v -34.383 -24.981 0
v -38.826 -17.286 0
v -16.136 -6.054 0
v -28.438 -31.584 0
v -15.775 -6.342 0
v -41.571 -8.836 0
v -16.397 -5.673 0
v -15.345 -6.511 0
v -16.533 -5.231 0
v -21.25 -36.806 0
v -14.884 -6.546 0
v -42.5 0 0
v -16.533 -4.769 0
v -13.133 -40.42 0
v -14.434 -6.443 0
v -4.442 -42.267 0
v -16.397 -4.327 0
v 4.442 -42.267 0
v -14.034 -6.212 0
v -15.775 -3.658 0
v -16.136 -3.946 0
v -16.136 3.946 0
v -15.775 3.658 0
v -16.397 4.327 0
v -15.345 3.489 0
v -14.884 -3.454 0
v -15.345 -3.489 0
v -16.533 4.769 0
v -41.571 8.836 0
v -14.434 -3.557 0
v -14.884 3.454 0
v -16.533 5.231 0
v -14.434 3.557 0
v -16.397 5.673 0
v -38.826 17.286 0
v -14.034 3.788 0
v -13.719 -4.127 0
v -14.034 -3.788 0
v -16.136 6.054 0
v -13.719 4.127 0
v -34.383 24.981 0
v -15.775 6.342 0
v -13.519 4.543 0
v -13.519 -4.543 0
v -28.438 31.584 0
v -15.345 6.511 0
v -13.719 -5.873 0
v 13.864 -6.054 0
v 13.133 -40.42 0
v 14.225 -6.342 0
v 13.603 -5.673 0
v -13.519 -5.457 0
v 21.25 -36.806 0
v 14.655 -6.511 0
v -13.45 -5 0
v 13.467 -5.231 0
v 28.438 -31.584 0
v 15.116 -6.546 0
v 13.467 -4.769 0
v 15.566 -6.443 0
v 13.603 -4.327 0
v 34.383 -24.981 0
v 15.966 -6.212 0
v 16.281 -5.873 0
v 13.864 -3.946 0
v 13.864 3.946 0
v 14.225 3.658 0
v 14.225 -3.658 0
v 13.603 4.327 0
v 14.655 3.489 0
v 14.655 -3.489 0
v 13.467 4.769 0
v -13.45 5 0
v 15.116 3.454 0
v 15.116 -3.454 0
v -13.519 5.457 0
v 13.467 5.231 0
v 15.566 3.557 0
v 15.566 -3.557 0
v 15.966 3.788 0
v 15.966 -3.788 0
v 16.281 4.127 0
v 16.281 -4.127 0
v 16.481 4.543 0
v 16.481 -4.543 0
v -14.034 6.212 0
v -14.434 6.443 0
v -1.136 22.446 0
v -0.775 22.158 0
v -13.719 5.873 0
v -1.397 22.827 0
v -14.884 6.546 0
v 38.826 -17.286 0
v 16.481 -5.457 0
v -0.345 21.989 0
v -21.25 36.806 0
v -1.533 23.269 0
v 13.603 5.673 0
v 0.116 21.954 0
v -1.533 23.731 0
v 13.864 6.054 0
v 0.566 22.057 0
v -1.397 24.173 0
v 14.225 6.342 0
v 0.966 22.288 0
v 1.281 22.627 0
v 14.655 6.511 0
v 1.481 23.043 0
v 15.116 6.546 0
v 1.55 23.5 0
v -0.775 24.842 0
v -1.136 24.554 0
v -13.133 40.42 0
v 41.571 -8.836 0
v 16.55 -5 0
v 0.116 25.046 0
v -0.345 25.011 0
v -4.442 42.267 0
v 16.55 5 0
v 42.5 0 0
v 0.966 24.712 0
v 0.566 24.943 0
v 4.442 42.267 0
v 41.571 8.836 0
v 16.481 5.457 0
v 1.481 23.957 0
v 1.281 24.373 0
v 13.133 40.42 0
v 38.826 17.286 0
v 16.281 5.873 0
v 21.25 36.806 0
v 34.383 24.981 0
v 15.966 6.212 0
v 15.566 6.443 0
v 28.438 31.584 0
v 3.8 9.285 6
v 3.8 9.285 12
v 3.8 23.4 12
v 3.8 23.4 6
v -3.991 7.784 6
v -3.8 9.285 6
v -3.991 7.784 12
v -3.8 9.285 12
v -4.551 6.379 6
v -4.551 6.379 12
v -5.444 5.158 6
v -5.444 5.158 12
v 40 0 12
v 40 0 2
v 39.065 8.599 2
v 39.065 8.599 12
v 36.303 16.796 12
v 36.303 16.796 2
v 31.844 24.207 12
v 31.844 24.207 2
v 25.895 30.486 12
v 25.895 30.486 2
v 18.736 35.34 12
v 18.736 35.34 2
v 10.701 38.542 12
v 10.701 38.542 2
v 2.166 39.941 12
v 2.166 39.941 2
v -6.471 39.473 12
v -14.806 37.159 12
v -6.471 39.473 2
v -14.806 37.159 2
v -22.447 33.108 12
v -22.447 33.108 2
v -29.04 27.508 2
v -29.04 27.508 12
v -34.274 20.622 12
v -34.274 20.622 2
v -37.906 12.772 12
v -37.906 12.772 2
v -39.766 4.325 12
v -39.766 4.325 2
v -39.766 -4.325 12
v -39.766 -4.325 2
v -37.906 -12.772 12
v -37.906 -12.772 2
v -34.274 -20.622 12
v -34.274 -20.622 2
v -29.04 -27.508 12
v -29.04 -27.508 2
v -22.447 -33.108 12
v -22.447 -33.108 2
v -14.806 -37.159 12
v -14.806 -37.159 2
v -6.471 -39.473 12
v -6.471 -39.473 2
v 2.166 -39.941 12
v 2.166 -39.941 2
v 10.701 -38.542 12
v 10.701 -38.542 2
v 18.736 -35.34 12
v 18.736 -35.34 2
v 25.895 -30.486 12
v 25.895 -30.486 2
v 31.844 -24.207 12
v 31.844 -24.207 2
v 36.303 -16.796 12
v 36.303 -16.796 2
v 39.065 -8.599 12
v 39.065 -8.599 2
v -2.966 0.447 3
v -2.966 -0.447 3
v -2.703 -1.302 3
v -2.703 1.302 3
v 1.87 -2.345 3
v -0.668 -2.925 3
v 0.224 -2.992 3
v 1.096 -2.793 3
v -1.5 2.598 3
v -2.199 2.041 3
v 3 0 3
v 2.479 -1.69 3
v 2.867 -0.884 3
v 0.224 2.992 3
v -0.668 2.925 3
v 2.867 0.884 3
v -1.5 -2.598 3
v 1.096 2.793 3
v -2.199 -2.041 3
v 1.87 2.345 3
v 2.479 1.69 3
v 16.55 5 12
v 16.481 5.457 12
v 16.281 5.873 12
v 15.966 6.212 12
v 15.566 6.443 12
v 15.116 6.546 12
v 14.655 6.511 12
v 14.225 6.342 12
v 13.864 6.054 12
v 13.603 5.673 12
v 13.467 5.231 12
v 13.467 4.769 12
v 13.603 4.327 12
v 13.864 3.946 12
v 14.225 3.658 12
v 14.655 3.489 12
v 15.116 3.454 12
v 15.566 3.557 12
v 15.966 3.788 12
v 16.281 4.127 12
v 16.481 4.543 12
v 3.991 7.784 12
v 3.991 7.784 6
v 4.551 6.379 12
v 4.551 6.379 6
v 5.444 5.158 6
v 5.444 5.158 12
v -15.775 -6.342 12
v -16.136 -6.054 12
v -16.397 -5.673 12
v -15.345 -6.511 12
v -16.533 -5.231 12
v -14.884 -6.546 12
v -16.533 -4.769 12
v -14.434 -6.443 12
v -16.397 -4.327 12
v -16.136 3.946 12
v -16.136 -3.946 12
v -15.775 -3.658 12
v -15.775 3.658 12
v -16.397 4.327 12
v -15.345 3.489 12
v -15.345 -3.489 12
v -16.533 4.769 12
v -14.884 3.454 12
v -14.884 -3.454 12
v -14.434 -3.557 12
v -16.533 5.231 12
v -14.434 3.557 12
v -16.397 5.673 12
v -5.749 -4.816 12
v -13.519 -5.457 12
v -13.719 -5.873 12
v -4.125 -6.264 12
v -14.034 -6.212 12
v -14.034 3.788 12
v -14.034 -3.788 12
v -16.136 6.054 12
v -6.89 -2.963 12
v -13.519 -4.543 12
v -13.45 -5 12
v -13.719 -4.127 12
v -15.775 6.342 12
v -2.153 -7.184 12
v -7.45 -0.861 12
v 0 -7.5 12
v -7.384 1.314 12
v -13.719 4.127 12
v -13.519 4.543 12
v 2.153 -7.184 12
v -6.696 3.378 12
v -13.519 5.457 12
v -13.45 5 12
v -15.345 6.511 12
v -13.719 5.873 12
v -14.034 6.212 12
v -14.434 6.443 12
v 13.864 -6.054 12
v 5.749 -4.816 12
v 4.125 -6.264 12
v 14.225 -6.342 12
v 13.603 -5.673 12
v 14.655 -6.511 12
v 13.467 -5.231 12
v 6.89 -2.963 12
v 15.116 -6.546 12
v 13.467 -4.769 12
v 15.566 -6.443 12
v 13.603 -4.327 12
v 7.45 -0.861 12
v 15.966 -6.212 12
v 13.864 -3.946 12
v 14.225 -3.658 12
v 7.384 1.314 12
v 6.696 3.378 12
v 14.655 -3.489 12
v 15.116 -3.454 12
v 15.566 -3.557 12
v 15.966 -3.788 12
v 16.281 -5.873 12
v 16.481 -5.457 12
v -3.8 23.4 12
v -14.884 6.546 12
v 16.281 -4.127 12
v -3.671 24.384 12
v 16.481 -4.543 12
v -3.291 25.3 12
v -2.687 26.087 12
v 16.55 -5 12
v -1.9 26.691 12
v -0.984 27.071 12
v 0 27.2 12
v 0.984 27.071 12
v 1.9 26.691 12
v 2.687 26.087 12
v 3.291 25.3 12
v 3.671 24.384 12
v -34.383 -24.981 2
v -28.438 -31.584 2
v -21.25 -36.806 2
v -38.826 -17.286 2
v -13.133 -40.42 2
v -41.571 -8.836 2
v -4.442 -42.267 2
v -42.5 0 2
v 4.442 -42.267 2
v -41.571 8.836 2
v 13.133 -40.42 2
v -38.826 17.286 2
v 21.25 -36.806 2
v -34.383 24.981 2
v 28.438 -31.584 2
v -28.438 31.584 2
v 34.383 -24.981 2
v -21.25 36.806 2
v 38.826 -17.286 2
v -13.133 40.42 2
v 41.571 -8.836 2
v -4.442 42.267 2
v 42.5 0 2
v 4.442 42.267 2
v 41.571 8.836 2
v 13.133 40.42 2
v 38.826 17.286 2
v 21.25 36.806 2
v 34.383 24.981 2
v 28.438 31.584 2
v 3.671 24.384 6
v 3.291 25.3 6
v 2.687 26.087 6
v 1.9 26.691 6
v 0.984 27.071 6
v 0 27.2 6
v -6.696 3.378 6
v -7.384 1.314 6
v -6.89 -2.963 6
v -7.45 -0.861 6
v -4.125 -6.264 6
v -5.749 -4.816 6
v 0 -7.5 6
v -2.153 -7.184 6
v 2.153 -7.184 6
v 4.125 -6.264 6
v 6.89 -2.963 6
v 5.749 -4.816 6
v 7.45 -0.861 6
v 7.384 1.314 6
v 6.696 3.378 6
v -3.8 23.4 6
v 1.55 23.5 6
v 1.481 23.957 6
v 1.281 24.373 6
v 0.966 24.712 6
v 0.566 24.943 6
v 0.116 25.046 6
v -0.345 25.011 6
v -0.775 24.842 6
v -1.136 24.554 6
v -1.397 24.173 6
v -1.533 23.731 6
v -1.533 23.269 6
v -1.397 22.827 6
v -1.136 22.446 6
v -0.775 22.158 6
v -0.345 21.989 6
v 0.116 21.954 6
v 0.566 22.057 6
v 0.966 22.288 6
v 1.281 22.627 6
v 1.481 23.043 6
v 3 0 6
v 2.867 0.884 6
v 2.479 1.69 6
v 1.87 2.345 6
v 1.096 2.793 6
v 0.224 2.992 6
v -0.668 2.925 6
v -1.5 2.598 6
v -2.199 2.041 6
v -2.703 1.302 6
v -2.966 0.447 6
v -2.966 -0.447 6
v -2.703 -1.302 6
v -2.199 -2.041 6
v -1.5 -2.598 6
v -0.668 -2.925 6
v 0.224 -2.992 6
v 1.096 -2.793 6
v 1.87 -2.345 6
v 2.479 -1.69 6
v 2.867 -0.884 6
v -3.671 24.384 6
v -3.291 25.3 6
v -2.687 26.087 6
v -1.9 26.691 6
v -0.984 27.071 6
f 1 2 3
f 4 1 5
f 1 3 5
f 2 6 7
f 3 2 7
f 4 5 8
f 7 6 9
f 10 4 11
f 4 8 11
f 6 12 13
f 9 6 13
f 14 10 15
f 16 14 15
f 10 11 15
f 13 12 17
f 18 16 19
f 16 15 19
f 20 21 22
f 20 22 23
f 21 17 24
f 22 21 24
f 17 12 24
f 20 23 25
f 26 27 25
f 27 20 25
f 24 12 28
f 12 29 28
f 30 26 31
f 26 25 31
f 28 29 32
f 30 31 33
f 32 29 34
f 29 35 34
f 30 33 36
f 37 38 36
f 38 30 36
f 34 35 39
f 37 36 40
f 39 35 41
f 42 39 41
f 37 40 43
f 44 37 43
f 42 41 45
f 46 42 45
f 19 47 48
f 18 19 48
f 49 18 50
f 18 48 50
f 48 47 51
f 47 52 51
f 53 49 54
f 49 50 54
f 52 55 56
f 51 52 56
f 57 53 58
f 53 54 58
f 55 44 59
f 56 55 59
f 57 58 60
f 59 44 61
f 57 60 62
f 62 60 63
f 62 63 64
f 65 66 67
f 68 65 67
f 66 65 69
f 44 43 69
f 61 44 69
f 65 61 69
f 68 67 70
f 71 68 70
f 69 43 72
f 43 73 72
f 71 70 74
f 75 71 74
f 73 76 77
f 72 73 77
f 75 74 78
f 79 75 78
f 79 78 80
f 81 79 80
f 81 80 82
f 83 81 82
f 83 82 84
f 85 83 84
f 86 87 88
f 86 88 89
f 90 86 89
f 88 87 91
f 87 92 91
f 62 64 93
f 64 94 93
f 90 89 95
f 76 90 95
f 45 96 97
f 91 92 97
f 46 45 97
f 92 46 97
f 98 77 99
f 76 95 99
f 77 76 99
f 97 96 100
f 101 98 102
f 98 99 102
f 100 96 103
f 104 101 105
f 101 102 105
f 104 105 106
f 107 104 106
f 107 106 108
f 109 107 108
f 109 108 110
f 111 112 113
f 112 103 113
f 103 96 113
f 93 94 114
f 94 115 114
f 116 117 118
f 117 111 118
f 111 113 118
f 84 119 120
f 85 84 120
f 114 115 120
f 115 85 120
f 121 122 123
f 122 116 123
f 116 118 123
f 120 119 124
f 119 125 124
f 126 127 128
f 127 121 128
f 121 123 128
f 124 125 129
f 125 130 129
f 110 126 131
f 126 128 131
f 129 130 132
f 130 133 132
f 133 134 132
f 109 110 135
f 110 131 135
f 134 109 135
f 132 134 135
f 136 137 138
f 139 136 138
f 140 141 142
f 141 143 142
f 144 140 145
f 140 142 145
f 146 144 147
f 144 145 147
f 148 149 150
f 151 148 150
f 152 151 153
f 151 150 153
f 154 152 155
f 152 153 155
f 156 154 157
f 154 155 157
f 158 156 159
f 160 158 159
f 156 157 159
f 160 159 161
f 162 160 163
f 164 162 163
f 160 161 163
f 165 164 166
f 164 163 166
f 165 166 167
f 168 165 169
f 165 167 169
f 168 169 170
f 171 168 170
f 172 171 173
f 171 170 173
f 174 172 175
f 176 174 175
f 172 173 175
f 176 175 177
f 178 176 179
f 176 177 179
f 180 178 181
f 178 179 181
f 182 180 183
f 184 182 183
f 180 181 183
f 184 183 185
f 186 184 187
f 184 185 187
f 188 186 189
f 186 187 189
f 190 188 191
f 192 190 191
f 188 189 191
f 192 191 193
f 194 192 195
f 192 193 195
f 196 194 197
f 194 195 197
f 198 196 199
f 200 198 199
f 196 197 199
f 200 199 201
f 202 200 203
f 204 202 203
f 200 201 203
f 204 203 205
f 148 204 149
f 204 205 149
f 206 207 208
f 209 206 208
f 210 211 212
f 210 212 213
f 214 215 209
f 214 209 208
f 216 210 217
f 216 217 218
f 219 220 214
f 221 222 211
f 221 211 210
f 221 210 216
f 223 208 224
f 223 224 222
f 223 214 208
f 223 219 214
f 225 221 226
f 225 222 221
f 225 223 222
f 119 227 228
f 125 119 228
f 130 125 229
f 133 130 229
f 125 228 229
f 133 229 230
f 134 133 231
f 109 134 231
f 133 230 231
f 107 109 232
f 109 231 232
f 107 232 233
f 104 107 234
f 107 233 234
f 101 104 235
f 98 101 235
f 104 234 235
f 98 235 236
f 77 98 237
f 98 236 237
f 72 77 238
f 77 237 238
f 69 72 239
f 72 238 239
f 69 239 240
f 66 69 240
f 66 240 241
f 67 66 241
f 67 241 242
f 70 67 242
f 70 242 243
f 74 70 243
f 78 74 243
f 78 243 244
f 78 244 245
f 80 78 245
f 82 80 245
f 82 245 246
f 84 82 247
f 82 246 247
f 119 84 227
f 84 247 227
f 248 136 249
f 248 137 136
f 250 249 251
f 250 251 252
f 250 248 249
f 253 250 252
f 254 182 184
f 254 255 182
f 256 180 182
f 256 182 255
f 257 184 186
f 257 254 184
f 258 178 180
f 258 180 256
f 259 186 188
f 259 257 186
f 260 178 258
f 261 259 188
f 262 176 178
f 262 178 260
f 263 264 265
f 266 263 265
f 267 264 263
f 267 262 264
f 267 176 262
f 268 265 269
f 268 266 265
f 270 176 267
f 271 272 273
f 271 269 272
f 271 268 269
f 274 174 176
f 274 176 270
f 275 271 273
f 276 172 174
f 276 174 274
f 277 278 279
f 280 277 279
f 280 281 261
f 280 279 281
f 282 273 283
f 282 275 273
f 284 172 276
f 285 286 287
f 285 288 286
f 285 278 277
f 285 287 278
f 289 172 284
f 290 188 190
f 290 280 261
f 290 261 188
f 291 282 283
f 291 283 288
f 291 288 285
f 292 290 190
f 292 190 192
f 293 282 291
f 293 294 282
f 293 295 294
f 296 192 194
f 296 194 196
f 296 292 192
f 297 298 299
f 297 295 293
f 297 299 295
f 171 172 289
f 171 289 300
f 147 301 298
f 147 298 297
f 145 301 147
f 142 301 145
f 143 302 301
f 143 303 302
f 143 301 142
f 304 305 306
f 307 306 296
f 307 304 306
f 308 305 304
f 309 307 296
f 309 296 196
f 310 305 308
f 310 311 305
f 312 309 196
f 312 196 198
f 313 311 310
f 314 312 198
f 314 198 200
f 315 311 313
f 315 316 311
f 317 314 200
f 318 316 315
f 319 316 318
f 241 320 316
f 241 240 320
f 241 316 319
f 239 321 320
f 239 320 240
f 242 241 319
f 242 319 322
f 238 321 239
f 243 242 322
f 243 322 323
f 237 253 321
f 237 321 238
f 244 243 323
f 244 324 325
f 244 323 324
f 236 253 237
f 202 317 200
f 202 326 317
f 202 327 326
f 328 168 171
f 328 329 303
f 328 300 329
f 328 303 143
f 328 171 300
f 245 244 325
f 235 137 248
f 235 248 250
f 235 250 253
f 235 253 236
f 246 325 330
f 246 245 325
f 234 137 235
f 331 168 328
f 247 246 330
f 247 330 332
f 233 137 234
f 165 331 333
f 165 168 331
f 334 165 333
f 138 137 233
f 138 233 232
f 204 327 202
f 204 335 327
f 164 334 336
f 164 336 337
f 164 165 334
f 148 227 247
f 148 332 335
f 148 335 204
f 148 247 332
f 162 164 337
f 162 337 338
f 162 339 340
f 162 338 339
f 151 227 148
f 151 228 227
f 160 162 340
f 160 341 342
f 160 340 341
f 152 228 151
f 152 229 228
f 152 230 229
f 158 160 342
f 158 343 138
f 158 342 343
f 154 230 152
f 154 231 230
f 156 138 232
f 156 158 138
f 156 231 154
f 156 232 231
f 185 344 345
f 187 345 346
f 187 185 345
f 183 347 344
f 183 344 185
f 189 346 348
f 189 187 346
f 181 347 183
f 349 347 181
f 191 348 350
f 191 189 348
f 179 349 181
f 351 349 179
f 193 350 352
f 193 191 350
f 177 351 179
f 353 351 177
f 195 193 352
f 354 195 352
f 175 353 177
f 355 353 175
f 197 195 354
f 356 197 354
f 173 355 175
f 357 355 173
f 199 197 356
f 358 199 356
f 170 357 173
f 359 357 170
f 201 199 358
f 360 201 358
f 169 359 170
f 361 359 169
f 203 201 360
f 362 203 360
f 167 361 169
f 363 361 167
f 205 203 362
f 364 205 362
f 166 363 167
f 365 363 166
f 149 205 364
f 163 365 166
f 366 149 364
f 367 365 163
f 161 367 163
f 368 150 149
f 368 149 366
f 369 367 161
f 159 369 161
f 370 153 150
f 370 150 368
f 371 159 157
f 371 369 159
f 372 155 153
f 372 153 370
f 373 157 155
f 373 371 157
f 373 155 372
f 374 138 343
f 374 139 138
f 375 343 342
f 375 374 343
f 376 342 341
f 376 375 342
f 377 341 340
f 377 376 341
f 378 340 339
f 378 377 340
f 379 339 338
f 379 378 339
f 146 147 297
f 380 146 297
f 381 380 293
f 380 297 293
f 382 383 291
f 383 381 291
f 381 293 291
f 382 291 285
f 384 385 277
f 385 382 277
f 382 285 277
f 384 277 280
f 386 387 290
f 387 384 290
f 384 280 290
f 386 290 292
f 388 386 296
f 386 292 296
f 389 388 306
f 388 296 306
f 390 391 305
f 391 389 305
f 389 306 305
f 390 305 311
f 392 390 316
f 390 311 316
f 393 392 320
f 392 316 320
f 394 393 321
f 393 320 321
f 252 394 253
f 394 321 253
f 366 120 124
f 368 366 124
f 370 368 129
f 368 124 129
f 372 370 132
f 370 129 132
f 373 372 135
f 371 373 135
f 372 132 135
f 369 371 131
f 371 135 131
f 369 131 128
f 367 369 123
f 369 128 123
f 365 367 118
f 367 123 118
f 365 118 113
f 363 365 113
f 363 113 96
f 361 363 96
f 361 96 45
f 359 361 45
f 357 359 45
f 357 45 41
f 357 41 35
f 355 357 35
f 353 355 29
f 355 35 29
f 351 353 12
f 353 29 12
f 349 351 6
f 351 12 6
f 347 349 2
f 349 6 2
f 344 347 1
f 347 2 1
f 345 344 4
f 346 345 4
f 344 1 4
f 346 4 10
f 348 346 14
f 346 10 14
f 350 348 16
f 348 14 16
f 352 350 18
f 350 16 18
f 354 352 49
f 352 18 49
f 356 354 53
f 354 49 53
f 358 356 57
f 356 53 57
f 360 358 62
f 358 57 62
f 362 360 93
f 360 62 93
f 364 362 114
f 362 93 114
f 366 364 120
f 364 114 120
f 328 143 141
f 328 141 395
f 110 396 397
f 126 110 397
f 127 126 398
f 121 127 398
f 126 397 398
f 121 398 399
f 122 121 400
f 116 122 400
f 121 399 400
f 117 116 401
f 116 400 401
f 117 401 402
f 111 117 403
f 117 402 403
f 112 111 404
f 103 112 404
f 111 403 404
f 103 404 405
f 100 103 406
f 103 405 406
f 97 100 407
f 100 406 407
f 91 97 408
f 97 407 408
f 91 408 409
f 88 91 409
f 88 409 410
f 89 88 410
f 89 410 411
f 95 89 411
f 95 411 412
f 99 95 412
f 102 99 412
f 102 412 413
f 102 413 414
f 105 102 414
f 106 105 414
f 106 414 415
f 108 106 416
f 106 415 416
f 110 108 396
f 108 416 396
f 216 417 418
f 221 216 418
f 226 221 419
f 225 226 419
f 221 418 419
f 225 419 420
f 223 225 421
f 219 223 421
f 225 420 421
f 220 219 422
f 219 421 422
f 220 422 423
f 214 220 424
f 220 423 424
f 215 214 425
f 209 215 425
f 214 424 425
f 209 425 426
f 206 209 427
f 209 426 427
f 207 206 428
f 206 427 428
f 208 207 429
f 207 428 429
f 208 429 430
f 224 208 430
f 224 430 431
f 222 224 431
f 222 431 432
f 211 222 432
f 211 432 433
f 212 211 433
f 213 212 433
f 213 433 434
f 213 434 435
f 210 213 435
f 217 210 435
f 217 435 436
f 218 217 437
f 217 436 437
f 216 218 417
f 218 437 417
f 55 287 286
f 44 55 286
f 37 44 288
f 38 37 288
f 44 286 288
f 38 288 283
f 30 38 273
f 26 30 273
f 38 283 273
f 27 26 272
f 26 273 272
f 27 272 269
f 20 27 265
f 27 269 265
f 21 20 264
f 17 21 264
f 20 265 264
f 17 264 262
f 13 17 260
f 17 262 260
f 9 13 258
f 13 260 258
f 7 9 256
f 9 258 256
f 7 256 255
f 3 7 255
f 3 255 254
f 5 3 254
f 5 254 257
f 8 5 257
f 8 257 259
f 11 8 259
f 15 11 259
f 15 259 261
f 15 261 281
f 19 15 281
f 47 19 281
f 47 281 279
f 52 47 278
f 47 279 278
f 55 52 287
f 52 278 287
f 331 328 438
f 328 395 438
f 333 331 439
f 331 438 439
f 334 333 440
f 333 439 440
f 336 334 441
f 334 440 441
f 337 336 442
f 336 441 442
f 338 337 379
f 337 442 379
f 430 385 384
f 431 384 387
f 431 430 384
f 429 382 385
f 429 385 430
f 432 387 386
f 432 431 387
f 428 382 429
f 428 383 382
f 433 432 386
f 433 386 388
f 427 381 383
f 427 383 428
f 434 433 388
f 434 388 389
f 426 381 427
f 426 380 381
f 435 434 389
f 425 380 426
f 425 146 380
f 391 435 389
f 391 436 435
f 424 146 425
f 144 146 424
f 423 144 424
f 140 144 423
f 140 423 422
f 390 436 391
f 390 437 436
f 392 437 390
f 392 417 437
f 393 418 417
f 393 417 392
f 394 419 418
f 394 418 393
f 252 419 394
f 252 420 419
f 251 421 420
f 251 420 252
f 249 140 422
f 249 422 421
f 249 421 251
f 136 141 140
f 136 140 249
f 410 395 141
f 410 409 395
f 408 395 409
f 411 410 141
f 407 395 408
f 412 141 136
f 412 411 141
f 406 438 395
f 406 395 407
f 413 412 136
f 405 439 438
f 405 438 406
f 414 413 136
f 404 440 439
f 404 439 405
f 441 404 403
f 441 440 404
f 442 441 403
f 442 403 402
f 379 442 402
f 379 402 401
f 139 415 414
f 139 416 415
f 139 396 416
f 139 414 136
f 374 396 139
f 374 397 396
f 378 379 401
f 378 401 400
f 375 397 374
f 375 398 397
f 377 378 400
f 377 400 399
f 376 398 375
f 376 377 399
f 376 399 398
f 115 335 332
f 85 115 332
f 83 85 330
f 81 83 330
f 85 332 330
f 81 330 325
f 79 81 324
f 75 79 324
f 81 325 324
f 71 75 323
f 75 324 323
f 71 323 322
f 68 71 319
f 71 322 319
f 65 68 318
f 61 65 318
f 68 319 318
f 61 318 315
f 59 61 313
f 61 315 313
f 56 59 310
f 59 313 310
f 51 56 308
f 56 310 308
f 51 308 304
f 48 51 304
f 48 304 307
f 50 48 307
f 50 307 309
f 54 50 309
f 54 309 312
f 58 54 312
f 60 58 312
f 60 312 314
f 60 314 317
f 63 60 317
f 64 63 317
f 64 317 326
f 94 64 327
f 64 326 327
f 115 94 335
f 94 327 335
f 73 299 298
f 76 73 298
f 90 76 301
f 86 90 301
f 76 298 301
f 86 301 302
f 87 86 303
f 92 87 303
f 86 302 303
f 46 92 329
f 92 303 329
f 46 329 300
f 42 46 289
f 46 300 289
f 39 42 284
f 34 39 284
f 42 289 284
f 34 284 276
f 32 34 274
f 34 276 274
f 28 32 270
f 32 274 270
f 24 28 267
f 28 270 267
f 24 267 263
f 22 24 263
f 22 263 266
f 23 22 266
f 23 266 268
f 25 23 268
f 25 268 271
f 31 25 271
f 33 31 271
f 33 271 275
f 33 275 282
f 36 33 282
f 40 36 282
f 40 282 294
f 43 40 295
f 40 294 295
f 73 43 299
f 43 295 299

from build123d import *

# Parameters (mm, degrees)
SKETCH_R        = 42.5
PAD_DEPTH       = 2
SKETCH001_R     = 40
PAD001_DEPTH    = 10
SKETCH002_R     = 7.5
POCKET_DEPTH    = 6
SKETCH003_W     = 7.6
SKETCH003_H     = 27.2
POCKET001_DEPTH = 6
FILLET_R        = 6
FILLET001_R     = 3.7999
SKETCH004_R     = 1.55
POCKET002_DEPTH = 6
SKETCH005_R     = 3
POCKET003_DEPTH = 3
SKETCH006_R     = 1.55
POCKET004_DEPTH = 12


with BuildPart() as part:
    # Sketch → Pad (new body)
    with BuildSketch(Plane.XY):
        Circle(SKETCH_R)
    extrude(amount=PAD_DEPTH)

    # Sketch001 (on Face3 of Pad) → Pad001 (join)
    with BuildSketch(Plane.XY.offset(2)):
        Circle(SKETCH001_R)
    extrude(amount=PAD001_DEPTH)

    # Sketch002 (on Face5 of Pad001) → Pocket (cut)
    with BuildSketch(Plane.XY.offset(12)):
        Circle(SKETCH002_R)
    extrude(amount=-POCKET_DEPTH, mode=Mode.SUBTRACT)

    # Sketch003 (on Face5 of Pocket) → Pocket001 (cut)
    with BuildSketch(Plane.XY.offset(12)):
        with Locations((0, 13.6)):
            Rectangle(SKETCH003_W, SKETCH003_H)
    extrude(amount=-POCKET001_DEPTH, mode=Mode.SUBTRACT)

    # Fillet
    fillet_edges = [part.edges().sort_by_distance(p)[0] for p in [
        (-3.8, 6.466065, 9),
        (3.8, 6.466065, 9),
    ]]
    fillet(fillet_edges, radius=FILLET_R)

    # Fillet001
    fillet001_edges = [part.edges().sort_by_distance(p)[0] for p in [
        (3.8, 27.2, 9),
        (-3.8, 27.2, 9),
    ]]
    fillet(fillet001_edges, radius=FILLET001_R)

    # Sketch004 (on Face12 of Fillet001) → Pocket002 (cut)
    with BuildSketch(Plane.XY.offset(6)):
        with Locations((0, 23.5)):
            Circle(SKETCH004_R)
    extrude(amount=-POCKET002_DEPTH, mode=Mode.SUBTRACT)

    # Sketch005 (on Face13 of Pocket002) → Pocket003 (cut)
    with BuildSketch(Plane.XY.offset(6)):
        Circle(SKETCH005_R)
    extrude(amount=-POCKET003_DEPTH, mode=Mode.SUBTRACT)

    # Sketch006 (on Face1 of Pocket003) → Pocket004 (cut)
    with BuildSketch(Plane.XY.offset(12)):
        with Locations((-15, 5)):
            Circle(SKETCH006_R)
        with Locations((15, 5)):
            Circle(SKETCH006_R)
        with Locations((15, -5)):
            Circle(SKETCH006_R)
        with Locations((-15, -5)):
            Circle(SKETCH006_R)
    extrude(amount=-POCKET004_DEPTH, mode=Mode.SUBTRACT)


solid = part.part
